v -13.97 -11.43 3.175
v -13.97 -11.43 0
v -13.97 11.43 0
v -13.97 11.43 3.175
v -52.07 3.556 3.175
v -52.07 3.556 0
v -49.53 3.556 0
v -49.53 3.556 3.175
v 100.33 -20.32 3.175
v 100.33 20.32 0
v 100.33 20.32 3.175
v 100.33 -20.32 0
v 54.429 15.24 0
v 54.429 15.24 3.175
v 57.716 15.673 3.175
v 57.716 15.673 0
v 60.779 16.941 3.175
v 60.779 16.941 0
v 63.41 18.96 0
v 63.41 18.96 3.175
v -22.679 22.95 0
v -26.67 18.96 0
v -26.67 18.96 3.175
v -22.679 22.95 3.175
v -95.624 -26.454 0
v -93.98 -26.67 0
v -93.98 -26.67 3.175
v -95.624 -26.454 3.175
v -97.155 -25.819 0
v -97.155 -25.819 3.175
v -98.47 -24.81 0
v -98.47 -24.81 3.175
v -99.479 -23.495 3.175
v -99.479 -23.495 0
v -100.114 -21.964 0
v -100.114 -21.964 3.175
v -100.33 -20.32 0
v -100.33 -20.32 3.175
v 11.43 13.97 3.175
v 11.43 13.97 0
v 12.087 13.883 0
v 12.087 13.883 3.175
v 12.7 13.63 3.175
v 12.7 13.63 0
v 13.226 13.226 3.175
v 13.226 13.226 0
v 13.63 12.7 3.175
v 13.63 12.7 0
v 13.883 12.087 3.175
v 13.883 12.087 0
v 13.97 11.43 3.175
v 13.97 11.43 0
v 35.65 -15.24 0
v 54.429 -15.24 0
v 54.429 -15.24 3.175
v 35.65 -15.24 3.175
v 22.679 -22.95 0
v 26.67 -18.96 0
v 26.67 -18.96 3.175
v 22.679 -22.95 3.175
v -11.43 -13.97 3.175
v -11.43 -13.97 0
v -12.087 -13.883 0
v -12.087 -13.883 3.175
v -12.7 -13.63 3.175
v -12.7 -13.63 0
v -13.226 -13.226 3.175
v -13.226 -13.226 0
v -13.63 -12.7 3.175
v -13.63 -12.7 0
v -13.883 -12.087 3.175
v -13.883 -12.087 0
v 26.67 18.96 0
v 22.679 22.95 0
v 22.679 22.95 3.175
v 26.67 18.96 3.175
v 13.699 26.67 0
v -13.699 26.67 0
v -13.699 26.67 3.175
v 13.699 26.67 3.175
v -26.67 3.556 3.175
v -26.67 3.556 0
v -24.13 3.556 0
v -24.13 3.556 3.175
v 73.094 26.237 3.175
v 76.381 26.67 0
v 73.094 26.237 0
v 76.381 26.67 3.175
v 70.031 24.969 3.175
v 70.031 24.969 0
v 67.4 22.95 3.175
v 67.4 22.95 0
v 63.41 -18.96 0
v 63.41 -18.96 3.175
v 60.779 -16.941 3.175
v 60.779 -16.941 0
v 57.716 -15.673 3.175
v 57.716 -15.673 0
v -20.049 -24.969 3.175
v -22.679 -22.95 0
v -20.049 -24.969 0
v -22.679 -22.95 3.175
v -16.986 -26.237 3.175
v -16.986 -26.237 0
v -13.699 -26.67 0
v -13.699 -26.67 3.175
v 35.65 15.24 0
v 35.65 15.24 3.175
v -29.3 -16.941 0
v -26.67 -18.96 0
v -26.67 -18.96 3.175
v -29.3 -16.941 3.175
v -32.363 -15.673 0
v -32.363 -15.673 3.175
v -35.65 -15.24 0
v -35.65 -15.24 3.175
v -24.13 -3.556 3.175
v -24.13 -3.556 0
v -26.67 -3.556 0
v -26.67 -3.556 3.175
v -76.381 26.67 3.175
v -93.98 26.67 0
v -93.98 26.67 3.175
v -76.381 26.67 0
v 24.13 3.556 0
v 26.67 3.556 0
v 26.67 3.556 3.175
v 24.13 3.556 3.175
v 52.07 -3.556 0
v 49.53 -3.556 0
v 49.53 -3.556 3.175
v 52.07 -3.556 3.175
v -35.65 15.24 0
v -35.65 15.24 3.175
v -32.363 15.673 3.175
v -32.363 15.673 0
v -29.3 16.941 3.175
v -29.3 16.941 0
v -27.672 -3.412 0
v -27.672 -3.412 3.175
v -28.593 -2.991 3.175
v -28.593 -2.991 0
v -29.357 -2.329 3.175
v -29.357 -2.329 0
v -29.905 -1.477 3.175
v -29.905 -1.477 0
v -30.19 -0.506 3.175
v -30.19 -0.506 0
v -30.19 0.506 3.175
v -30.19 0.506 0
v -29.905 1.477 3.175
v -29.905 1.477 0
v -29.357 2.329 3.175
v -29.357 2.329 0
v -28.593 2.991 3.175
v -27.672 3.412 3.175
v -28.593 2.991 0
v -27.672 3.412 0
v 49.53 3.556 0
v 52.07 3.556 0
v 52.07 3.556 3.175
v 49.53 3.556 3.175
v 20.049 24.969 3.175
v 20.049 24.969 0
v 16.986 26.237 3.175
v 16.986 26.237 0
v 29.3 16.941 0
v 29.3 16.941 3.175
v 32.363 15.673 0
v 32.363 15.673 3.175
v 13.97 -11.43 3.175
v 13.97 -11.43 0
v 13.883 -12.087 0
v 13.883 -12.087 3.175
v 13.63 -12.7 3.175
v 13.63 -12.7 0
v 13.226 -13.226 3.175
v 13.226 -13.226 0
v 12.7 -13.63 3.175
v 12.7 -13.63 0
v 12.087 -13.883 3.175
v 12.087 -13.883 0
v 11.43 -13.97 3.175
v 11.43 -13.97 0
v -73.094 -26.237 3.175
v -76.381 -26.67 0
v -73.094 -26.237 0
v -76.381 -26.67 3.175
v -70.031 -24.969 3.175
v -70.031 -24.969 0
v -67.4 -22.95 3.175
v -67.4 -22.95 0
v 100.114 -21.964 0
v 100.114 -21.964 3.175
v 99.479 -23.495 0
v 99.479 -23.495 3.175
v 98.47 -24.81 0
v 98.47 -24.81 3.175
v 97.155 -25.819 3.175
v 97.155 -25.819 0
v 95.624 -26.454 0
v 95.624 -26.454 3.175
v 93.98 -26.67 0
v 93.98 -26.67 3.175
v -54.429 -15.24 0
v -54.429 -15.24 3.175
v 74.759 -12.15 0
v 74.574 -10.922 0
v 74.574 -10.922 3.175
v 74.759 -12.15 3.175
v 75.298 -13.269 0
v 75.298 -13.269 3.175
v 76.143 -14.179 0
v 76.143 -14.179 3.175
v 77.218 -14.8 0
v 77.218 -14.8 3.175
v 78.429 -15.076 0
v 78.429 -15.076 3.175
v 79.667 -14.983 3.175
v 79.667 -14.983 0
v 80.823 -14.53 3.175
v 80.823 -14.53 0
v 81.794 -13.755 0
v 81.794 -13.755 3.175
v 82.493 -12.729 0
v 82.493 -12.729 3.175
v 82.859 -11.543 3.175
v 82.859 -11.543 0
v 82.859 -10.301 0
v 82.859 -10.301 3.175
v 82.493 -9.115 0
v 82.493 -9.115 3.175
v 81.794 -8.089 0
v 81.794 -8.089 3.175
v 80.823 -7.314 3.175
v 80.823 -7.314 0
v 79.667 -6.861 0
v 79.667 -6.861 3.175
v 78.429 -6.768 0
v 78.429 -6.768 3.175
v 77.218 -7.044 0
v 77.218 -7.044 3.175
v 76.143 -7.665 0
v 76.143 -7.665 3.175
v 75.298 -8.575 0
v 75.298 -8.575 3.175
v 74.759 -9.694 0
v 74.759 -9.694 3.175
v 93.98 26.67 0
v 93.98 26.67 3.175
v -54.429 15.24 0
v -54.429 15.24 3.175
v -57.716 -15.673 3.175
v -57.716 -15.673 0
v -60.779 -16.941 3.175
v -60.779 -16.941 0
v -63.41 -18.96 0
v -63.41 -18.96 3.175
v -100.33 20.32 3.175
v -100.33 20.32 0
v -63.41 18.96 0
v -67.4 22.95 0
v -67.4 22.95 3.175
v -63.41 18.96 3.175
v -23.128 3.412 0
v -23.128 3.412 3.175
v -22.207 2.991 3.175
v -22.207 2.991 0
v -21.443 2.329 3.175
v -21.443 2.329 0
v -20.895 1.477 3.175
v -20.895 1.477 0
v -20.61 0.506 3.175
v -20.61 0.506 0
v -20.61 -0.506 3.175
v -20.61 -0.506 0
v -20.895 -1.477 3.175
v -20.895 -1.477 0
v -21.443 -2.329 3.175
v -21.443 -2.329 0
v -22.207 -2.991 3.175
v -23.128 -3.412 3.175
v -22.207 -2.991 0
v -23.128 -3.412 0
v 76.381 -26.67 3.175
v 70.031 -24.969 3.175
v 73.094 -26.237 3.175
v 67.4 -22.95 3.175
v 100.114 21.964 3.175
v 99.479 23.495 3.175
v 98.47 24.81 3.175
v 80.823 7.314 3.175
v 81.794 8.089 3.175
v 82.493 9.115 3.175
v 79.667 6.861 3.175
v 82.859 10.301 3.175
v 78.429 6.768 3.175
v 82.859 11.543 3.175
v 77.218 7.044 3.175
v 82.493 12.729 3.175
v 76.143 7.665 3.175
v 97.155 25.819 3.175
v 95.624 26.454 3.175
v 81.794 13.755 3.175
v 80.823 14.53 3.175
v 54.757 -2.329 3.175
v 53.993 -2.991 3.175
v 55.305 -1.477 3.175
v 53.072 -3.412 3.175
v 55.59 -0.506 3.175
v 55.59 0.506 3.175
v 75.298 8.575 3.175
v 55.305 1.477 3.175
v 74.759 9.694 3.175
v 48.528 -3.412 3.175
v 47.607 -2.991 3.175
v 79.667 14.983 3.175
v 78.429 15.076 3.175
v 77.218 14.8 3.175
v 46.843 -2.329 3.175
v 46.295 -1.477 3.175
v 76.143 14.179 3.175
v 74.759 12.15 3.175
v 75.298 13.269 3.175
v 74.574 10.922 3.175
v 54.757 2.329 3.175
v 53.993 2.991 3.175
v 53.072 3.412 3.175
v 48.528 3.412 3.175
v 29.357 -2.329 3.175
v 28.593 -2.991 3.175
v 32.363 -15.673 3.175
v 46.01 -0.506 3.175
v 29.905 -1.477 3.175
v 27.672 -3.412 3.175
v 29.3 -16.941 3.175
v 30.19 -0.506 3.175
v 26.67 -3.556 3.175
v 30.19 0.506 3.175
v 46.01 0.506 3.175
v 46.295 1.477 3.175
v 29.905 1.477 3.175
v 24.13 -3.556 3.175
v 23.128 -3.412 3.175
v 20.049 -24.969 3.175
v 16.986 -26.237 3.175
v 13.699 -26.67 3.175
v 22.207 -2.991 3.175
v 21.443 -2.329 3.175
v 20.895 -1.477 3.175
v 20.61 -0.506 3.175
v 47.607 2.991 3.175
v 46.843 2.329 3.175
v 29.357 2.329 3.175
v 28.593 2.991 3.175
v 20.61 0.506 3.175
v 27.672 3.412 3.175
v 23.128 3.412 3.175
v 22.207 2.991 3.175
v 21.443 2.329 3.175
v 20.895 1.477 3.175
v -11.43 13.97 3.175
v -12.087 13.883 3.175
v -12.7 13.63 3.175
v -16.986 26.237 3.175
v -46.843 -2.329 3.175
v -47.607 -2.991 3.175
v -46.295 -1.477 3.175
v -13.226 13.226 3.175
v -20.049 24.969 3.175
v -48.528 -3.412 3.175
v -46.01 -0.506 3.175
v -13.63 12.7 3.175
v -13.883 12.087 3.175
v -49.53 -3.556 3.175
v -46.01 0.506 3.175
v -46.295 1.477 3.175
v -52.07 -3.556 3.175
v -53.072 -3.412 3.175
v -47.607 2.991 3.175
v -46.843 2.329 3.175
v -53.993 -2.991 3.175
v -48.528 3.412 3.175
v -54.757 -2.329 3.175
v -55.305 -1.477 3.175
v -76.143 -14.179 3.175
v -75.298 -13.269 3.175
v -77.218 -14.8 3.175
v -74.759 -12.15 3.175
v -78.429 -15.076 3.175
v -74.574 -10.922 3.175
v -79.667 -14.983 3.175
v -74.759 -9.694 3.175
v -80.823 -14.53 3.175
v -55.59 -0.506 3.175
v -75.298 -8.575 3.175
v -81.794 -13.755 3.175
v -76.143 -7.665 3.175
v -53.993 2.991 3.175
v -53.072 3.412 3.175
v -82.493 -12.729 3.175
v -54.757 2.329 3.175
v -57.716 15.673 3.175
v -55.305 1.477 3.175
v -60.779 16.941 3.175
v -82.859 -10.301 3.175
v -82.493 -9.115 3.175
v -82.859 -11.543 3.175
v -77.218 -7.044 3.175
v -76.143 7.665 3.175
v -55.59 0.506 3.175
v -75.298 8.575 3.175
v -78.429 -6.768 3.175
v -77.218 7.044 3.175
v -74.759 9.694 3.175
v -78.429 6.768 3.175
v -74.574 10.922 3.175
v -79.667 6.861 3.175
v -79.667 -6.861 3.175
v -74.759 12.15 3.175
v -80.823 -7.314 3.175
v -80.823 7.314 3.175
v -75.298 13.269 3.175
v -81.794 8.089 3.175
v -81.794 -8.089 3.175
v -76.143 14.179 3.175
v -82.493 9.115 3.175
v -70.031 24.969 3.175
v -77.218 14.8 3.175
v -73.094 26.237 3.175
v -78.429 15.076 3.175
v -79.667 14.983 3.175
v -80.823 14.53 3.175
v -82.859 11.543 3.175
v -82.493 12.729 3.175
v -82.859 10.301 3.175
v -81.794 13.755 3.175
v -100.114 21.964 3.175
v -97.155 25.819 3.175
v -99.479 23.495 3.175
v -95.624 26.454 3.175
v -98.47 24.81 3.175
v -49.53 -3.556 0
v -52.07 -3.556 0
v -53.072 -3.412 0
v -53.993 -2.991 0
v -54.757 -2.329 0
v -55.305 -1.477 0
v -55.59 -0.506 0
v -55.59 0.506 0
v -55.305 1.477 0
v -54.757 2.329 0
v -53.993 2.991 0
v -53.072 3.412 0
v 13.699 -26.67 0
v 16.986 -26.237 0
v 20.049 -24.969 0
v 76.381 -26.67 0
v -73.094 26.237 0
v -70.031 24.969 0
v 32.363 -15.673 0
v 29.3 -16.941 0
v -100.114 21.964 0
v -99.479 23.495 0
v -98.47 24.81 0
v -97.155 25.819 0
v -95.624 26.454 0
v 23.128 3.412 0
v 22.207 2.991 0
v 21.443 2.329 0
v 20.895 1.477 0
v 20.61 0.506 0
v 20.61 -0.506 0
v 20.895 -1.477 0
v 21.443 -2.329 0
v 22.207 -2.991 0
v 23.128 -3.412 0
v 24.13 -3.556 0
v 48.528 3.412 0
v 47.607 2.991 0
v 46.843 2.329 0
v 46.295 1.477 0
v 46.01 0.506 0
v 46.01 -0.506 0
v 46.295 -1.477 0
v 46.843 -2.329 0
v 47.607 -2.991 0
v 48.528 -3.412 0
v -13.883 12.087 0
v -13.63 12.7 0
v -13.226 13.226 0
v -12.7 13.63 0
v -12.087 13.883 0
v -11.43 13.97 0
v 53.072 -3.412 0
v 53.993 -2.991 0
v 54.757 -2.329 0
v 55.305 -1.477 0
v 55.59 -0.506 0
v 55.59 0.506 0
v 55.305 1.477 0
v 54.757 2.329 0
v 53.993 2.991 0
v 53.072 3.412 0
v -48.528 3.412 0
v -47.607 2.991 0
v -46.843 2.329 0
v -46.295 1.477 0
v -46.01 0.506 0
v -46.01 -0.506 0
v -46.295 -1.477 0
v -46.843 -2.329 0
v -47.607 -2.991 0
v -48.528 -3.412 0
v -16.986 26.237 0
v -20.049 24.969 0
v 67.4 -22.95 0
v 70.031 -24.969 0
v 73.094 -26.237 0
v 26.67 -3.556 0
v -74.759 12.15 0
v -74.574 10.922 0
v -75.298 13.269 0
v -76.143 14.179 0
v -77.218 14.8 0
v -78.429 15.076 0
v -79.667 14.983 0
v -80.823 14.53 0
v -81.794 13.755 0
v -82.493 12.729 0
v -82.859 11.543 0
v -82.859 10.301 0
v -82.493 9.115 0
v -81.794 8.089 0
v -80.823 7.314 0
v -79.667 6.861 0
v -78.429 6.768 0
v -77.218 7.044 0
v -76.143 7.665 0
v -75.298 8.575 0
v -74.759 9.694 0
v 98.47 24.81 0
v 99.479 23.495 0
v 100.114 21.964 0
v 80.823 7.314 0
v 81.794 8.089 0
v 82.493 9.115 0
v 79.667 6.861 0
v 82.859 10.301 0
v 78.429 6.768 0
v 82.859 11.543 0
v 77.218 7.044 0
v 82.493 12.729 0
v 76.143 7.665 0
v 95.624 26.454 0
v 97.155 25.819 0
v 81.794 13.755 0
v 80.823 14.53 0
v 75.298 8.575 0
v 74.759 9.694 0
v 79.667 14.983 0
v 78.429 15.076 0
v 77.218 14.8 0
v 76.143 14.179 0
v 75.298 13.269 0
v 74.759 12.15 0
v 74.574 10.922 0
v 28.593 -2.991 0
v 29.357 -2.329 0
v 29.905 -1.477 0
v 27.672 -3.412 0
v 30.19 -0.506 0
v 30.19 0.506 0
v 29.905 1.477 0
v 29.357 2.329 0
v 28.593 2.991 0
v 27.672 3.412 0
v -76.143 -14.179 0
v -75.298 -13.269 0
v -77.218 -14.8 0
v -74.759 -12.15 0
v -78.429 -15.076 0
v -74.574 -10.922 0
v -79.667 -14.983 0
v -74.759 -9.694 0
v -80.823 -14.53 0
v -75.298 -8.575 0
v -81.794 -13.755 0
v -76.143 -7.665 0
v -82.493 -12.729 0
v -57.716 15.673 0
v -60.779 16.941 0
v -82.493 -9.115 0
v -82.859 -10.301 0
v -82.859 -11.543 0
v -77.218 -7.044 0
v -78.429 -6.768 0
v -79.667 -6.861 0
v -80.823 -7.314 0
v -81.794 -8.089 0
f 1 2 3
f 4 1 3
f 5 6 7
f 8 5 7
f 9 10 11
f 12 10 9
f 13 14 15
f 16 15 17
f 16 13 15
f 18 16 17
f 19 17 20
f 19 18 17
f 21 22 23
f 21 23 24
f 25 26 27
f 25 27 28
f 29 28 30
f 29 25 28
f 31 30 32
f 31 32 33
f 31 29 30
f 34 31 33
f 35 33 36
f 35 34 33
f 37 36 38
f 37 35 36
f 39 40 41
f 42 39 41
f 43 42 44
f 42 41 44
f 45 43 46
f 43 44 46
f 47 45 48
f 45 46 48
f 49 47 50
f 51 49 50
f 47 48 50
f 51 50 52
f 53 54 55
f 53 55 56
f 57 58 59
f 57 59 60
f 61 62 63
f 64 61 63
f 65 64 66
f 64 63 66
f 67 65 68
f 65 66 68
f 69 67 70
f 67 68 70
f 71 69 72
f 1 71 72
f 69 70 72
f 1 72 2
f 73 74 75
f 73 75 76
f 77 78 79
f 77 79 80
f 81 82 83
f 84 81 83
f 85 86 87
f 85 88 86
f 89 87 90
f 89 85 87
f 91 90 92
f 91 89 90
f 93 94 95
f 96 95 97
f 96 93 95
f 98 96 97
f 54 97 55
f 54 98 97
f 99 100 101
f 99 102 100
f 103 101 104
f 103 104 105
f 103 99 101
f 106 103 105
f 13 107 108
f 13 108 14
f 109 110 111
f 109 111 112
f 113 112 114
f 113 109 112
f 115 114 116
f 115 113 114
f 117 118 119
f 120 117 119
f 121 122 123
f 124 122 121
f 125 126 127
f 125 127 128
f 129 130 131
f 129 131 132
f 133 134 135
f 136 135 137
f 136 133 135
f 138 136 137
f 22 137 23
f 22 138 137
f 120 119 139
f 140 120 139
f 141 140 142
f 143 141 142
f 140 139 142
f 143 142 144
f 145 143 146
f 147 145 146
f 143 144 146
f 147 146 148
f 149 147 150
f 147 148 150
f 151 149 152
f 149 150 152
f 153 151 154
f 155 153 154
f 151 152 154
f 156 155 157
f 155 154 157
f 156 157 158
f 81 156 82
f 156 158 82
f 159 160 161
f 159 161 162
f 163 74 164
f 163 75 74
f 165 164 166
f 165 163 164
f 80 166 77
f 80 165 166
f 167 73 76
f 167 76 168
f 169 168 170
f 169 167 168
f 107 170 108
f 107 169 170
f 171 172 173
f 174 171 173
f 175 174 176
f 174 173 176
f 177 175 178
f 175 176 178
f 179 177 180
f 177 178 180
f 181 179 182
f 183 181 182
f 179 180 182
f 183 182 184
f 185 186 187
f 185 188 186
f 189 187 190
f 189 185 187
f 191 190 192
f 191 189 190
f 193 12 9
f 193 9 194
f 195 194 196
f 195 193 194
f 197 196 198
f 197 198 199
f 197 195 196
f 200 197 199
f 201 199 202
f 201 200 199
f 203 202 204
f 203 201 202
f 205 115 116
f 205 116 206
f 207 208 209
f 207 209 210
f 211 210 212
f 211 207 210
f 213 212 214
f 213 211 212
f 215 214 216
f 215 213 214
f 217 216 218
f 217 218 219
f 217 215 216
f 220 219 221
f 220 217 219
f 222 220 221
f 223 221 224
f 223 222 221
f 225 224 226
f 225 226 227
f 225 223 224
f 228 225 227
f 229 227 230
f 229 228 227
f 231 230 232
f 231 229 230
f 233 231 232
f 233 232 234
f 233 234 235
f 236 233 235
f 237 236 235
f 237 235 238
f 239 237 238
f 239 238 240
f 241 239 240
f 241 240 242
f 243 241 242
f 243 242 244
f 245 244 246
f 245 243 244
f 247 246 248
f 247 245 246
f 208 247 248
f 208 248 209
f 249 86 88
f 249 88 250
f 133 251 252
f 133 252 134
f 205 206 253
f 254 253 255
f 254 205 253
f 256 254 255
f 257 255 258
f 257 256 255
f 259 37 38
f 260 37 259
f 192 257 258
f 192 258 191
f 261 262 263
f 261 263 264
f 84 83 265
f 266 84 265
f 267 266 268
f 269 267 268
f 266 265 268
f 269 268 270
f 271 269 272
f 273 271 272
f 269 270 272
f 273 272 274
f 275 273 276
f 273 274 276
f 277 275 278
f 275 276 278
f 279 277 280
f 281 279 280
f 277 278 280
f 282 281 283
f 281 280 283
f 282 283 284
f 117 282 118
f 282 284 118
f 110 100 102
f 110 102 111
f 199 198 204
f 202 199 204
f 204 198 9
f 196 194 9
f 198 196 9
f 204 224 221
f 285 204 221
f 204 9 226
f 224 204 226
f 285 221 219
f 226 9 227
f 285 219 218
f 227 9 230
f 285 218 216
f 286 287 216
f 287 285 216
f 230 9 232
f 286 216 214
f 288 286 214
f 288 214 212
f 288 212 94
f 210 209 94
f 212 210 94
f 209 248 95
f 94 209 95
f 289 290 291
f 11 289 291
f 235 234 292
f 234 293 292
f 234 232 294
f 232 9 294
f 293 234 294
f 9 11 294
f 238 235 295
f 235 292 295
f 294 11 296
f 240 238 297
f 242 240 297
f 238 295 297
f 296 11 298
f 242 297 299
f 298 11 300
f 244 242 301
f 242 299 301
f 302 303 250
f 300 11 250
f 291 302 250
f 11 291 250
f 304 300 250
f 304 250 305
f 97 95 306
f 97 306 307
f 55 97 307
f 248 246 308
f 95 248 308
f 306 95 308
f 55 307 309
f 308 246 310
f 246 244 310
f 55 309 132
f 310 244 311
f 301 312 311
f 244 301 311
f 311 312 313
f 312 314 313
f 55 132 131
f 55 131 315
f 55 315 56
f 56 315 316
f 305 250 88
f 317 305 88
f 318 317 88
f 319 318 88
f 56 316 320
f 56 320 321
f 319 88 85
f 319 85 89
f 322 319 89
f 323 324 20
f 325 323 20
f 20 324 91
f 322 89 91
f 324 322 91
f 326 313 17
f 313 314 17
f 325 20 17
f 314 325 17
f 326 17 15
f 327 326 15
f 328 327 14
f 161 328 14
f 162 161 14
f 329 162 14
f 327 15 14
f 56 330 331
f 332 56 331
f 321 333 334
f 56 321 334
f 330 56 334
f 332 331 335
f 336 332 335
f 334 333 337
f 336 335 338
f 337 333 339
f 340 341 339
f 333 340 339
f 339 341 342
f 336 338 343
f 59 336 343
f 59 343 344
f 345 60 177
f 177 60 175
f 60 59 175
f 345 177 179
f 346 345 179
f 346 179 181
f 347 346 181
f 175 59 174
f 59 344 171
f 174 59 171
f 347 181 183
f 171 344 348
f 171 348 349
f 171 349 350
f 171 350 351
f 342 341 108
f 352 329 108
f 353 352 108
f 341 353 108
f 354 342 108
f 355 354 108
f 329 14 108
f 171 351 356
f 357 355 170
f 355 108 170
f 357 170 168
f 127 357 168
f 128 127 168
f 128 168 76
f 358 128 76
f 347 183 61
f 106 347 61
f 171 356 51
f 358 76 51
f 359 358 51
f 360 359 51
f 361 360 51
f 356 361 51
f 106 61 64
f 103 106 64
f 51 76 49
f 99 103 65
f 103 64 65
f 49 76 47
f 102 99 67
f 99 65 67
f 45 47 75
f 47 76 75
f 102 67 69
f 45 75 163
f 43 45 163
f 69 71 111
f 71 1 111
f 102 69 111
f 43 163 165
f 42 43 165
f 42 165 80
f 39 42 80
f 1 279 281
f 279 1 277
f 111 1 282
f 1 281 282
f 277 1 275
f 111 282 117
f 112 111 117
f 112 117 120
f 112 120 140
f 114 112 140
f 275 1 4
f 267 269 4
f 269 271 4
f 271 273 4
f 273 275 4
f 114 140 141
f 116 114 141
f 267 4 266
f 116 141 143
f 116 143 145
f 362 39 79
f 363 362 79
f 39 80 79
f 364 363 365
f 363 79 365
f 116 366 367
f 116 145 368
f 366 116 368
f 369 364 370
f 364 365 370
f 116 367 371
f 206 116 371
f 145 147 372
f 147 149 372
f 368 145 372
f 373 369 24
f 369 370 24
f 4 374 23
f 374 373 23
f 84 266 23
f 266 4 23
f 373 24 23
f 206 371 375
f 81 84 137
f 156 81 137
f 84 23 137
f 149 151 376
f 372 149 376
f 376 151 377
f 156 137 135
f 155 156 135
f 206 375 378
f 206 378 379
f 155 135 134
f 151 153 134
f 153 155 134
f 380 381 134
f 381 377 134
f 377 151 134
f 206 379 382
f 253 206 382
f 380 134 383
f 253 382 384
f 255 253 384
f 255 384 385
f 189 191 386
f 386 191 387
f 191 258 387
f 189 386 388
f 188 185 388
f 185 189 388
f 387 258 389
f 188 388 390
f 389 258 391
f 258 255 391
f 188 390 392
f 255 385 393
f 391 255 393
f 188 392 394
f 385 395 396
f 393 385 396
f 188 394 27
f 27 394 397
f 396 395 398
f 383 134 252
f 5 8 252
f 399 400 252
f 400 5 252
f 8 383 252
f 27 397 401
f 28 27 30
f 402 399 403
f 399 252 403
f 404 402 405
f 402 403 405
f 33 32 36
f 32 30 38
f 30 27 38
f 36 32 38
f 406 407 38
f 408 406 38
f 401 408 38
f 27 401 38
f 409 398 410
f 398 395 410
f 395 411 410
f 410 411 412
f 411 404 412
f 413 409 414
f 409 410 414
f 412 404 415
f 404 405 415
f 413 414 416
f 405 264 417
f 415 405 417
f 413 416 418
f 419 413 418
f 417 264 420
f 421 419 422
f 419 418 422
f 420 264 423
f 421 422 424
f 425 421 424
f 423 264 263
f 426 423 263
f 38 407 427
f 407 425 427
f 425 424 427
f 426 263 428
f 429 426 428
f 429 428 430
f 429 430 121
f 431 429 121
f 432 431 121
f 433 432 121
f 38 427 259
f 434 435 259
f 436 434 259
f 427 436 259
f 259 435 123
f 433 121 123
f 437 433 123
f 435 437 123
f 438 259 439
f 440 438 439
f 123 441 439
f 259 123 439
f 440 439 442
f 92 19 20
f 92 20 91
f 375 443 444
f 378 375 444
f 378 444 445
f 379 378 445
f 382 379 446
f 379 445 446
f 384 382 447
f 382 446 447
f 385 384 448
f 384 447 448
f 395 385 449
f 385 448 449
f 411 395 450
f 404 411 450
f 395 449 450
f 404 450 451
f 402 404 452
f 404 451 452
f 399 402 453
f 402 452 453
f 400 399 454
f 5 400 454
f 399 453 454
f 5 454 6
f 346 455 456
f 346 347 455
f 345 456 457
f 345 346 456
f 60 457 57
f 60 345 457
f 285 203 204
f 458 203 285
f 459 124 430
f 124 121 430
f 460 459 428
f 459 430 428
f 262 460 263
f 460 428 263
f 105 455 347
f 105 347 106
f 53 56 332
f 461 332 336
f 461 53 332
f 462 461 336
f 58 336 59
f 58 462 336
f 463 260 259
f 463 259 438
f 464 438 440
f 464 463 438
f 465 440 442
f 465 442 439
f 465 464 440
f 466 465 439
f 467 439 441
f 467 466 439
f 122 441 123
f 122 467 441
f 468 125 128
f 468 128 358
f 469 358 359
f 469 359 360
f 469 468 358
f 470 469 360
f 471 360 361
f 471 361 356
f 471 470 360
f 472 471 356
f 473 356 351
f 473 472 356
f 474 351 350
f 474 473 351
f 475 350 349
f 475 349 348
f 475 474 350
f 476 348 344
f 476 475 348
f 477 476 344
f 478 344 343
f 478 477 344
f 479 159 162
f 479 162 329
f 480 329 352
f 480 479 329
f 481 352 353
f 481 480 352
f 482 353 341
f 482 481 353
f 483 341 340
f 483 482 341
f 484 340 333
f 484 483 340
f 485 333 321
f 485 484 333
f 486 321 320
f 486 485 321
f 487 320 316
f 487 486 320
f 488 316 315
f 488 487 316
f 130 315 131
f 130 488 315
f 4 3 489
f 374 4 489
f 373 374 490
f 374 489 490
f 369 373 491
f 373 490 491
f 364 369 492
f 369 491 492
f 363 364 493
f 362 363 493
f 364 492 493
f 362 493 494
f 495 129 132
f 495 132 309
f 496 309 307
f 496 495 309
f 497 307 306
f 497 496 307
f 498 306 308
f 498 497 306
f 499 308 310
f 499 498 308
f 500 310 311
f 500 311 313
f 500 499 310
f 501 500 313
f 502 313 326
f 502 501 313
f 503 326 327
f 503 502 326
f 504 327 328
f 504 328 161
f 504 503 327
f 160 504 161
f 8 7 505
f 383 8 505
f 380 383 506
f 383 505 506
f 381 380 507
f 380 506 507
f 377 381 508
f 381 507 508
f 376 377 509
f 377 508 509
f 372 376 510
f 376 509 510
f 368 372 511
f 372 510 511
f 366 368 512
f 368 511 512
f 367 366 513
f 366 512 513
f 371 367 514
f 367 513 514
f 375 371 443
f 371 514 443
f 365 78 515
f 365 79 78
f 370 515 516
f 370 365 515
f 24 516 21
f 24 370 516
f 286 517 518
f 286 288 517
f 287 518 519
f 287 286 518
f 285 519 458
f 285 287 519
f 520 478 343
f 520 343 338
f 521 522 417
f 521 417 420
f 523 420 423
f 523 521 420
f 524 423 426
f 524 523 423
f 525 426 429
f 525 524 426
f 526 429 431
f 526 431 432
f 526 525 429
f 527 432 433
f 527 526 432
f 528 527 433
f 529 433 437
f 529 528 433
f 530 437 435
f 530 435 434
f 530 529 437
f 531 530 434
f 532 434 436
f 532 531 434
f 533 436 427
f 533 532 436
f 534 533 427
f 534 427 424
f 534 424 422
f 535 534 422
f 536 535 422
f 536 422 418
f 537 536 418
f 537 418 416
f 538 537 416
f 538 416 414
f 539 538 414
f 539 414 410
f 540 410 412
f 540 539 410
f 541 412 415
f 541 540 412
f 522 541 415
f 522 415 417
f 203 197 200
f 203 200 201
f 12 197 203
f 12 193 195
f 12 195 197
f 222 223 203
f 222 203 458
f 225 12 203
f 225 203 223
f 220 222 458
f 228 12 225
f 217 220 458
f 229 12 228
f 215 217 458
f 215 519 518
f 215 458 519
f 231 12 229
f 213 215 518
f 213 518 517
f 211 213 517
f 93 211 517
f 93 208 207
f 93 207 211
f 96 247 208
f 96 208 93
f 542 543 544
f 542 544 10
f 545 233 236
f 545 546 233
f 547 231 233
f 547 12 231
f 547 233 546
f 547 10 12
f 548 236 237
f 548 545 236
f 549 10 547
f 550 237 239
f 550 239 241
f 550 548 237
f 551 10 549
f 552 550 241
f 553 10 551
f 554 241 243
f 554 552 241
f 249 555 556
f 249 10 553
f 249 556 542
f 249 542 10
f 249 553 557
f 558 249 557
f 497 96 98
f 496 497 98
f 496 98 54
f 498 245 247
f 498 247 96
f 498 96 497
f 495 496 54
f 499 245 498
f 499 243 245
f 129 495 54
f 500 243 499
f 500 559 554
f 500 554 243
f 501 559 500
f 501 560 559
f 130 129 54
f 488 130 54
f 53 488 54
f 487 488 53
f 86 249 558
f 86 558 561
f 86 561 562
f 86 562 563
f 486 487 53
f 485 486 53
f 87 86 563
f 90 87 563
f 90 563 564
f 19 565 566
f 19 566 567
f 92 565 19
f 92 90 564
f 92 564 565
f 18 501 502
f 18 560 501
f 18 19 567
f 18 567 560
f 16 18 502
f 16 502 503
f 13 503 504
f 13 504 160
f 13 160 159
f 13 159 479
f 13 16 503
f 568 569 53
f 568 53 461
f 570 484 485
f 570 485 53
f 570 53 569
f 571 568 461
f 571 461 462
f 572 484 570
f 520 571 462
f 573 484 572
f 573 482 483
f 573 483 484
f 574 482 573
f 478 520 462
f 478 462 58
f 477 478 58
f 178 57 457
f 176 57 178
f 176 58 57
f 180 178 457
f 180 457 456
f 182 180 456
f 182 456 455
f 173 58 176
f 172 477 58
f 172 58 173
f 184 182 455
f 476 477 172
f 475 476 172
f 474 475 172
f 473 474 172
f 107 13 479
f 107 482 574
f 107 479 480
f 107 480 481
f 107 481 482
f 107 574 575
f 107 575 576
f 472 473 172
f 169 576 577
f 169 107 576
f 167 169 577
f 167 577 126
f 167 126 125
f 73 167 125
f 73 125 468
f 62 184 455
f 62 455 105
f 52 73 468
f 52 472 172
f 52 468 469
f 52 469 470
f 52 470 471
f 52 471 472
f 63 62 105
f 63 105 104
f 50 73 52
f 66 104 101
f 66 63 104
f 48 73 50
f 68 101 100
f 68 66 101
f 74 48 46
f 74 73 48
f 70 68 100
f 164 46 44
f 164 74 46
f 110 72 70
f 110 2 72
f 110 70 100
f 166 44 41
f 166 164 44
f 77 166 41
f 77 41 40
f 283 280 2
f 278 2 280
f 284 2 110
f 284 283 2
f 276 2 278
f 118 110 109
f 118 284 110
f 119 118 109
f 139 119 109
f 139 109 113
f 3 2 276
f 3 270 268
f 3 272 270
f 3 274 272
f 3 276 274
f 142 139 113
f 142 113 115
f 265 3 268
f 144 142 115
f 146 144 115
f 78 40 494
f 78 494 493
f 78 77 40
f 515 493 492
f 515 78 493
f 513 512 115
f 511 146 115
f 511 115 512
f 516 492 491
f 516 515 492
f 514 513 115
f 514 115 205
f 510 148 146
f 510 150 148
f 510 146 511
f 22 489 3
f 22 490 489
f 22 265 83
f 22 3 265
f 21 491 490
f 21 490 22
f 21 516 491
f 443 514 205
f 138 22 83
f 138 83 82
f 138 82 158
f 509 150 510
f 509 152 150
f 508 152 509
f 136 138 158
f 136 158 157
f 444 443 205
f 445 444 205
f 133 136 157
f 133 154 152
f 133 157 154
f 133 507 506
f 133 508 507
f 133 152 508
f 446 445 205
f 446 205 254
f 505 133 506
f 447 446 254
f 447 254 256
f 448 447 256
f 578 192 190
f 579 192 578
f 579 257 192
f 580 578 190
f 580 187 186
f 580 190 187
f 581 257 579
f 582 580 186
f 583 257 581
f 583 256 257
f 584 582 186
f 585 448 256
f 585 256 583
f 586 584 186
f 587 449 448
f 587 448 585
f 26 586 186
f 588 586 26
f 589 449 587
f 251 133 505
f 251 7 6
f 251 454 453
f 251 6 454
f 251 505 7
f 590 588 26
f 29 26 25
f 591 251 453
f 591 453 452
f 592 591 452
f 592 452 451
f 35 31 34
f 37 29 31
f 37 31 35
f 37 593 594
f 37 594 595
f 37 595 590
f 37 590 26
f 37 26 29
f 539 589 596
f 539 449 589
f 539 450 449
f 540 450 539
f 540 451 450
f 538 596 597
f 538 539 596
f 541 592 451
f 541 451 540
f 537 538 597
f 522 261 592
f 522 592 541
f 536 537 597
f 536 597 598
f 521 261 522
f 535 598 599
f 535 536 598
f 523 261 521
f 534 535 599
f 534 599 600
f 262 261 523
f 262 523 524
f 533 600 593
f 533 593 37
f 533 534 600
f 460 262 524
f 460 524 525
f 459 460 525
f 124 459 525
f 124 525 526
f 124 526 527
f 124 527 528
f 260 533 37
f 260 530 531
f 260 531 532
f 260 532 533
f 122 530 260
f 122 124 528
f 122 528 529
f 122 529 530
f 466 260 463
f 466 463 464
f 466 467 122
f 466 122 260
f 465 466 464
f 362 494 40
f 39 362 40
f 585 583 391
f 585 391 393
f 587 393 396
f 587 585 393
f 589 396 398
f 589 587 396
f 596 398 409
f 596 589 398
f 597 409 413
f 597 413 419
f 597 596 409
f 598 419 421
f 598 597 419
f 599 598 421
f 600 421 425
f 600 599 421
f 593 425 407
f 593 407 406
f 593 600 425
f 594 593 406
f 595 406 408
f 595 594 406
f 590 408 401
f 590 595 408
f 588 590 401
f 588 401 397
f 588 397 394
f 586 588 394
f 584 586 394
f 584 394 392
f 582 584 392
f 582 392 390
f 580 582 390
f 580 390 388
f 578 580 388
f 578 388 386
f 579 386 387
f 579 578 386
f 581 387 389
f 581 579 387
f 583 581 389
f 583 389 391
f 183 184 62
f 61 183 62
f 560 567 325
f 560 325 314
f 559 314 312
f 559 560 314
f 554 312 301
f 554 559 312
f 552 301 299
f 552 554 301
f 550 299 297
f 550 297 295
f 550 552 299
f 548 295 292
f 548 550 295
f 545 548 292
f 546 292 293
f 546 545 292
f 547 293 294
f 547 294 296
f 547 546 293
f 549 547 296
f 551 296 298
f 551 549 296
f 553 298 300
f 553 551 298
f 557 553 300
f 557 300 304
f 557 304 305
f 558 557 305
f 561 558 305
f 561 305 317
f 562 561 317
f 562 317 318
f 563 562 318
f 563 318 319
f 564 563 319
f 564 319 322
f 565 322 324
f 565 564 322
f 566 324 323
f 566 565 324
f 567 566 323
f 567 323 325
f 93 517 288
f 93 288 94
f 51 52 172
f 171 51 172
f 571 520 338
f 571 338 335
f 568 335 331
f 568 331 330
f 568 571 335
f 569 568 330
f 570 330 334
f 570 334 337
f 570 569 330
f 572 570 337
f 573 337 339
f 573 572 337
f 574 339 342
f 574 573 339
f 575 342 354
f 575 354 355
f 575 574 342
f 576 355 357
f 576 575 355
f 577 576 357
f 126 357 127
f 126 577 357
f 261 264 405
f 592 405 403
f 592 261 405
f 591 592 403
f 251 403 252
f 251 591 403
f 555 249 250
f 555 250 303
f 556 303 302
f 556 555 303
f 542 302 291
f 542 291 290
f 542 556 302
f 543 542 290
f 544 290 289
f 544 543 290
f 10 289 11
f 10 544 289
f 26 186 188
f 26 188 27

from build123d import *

# Parameters (mm, degrees)
SKETCH1_R           = 4.1656
BOSS_EXTRUDE1_DEPTH = 3.175
CUT_EXTRUDE2_DEPTH  = 104.862786526
FILLET1_R           = 12.7


with BuildPart() as part:
    # Sketch1 → Boss-Extrude1 (new body)
    with BuildSketch(Plane.XY):
        with BuildLine():
            Line((-93.98, 26.67), (93.98, 26.67))
            ThreePointArc((93.98, 26.67), (98.470128061, 24.810128061), (100.33, 20.32))
            Line((100.33, 20.32), (100.33, -20.32))
            ThreePointArc((100.33, -20.32), (98.470128061, -24.810128061), (93.98, -26.67))
            Line((93.98, -26.67), (-93.98, -26.67))
            ThreePointArc((-93.98, -26.67), (-98.470128061, -24.810128061), (-100.33, -20.32))
            Line((-100.33, -20.32), (-100.33, 20.32))
            ThreePointArc((-100.33, 20.32), (-98.470128061, 24.810128061), (-93.98, 26.67))
        make_face()
        with Locations((-78.74, 10.922)):
            Circle(SKETCH1_R, mode=Mode.SUBTRACT)
        with Locations((-78.74, -10.922)):
            Circle(SKETCH1_R, mode=Mode.SUBTRACT)
        with Locations(Location((78.74, -10.922, 0), (0, 0, 180))):
            Circle(SKETCH1_R, mode=Mode.SUBTRACT)
        with Locations(Location((78.74, 10.922, 0), (0, 0, 180))):
            Circle(SKETCH1_R, mode=Mode.SUBTRACT)
        with BuildLine():
            Line((-11.43, 13.97), (11.43, 13.97))
            ThreePointArc((11.43, 13.97), (13.226051224, 13.226051224), (13.97, 11.43))
            Line((13.97, 11.43), (13.97, -11.43))
            ThreePointArc((13.97, -11.43), (13.226051224, -13.226051224), (11.43, -13.97))
            Line((11.43, -13.97), (-11.43, -13.97))
            ThreePointArc((-11.43, -13.97), (-13.226051224, -13.226051224), (-13.97, -11.43))
            Line((-13.97, -11.43), (-13.97, 11.43))
            ThreePointArc((-13.97, 11.43), (-13.226051224, 13.226051224), (-11.43, 13.97))
        make_face(mode=Mode.SUBTRACT)
        with BuildLine():
            Line((-52.07, 3.556), (-49.53, 3.556))
            ThreePointArc((-49.53, 3.556), (-45.974, 0), (-49.53, -3.556))
            Line((-49.53, -3.556), (-52.07, -3.556))
            ThreePointArc((-52.07, -3.556), (-55.626, 0), (-52.07, 3.556))
        make_face(mode=Mode.SUBTRACT)
        with BuildLine():
            Line((-26.67, 3.556), (-24.13, 3.556))
            ThreePointArc((-24.13, 3.556), (-20.574, 0), (-24.13, -3.556))
            Line((-24.13, -3.556), (-26.67, -3.556))
            ThreePointArc((-26.67, -3.556), (-30.226, 0), (-26.67, 3.556))
        make_face(mode=Mode.SUBTRACT)
        with BuildLine():
            Line((26.67, 3.556), (24.13, 3.556))
            ThreePointArc((24.13, 3.556), (20.574, 0), (24.13, -3.556))
            Line((24.13, -3.556), (26.67, -3.556))
            ThreePointArc((26.67, -3.556), (30.226, 0), (26.67, 3.556))
        make_face(mode=Mode.SUBTRACT)
        with BuildLine():
            Line((52.07, 3.556), (49.53, 3.556))
            ThreePointArc((49.53, 3.556), (45.974, 0), (49.53, -3.556))
            Line((49.53, -3.556), (52.07, -3.556))
            ThreePointArc((52.07, -3.556), (55.626, 0), (52.07, 3.556))
        make_face(mode=Mode.SUBTRACT)
    extrude(amount=BOSS_EXTRUDE1_DEPTH)

    # Sketch3 → Cut-Extrude2 (cut, through all)
    with BuildSketch(Plane.XY):
        with BuildLine():
            Line((-71.12, 26.67), (-63.409743879, 18.959743879))
            ThreePointArc((-63.409743879, 18.959743879), (-59.289567349, 16.206729937), (-54.429487758, 15.24))
            Line((-54.429487758, 15.24), (-35.650256121, 15.24))
            ThreePointArc((-35.650256121, 15.24), (-30.79017653, 16.206729937), (-26.67, 18.959743879))
            Line((-26.67, 18.959743879), (-18.959743879, 26.67))
            Line((-18.959743879, 26.67), (-71.12, 26.67))
        make_face()
        with BuildLine():
            Line((-71.12, -26.67), (-18.959743879, -26.67))
            Line((-18.959743879, -26.67), (-26.67, -18.959743879))
            ThreePointArc((-26.67, -18.959743879), (-30.79017653, -16.206729937), (-35.650256121, -15.24))
            Line((-35.650256121, -15.24), (-54.429487758, -15.24))
            ThreePointArc((-54.429487758, -15.24), (-59.289567349, -16.206729937), (-63.409743879, -18.959743879))
            Line((-63.409743879, -18.959743879), (-71.12, -26.67))
        make_face()
        with BuildLine():
            Line((71.12, -26.67), (63.409743879, -18.959743879))
            ThreePointArc((63.409743879, -18.959743879), (59.289567349, -16.206729937), (54.429487758, -15.24))
            Line((54.429487758, -15.24), (35.650256121, -15.24))
            ThreePointArc((35.650256121, -15.24), (30.79017653, -16.206729937), (26.67, -18.959743879))
            Line((26.67, -18.959743879), (18.959743879, -26.67))
            Line((18.959743879, -26.67), (71.12, -26.67))
        make_face()
        with BuildLine():
            Line((71.12, 26.67), (18.959743879, 26.67))
            Line((18.959743879, 26.67), (26.67, 18.959743879))
            ThreePointArc((26.67, 18.959743879), (30.79017653, 16.206729937), (35.650256121, 15.24))
            Line((35.650256121, 15.24), (54.429487758, 15.24))
            ThreePointArc((54.429487758, 15.24), (59.289567349, 16.206729937), (63.409743879, 18.959743879))
            Line((63.409743879, 18.959743879), (71.12, 26.67))
        make_face()
    extrude(amount=CUT_EXTRUDE2_DEPTH, mode=Mode.SUBTRACT)

    # Fillet1
    fillet1_edges = [part.edges().sort_by_distance(p)[0] for p in [
        (-18.959743879, 26.67, 1.5875),
        (-71.12, 26.67, 1.5875),
        (-71.12, -26.67, 1.5875),
        (-18.959743879, -26.67, 1.5875),
        (71.12, 26.67, 1.5875),
        (18.959743879, 26.67, 1.5875),
        (18.959743879, -26.67, 1.5875),
        (71.12, -26.67, 1.5875),
    ]]
    fillet(fillet1_edges, radius=FILLET1_R)


solid = part.part
